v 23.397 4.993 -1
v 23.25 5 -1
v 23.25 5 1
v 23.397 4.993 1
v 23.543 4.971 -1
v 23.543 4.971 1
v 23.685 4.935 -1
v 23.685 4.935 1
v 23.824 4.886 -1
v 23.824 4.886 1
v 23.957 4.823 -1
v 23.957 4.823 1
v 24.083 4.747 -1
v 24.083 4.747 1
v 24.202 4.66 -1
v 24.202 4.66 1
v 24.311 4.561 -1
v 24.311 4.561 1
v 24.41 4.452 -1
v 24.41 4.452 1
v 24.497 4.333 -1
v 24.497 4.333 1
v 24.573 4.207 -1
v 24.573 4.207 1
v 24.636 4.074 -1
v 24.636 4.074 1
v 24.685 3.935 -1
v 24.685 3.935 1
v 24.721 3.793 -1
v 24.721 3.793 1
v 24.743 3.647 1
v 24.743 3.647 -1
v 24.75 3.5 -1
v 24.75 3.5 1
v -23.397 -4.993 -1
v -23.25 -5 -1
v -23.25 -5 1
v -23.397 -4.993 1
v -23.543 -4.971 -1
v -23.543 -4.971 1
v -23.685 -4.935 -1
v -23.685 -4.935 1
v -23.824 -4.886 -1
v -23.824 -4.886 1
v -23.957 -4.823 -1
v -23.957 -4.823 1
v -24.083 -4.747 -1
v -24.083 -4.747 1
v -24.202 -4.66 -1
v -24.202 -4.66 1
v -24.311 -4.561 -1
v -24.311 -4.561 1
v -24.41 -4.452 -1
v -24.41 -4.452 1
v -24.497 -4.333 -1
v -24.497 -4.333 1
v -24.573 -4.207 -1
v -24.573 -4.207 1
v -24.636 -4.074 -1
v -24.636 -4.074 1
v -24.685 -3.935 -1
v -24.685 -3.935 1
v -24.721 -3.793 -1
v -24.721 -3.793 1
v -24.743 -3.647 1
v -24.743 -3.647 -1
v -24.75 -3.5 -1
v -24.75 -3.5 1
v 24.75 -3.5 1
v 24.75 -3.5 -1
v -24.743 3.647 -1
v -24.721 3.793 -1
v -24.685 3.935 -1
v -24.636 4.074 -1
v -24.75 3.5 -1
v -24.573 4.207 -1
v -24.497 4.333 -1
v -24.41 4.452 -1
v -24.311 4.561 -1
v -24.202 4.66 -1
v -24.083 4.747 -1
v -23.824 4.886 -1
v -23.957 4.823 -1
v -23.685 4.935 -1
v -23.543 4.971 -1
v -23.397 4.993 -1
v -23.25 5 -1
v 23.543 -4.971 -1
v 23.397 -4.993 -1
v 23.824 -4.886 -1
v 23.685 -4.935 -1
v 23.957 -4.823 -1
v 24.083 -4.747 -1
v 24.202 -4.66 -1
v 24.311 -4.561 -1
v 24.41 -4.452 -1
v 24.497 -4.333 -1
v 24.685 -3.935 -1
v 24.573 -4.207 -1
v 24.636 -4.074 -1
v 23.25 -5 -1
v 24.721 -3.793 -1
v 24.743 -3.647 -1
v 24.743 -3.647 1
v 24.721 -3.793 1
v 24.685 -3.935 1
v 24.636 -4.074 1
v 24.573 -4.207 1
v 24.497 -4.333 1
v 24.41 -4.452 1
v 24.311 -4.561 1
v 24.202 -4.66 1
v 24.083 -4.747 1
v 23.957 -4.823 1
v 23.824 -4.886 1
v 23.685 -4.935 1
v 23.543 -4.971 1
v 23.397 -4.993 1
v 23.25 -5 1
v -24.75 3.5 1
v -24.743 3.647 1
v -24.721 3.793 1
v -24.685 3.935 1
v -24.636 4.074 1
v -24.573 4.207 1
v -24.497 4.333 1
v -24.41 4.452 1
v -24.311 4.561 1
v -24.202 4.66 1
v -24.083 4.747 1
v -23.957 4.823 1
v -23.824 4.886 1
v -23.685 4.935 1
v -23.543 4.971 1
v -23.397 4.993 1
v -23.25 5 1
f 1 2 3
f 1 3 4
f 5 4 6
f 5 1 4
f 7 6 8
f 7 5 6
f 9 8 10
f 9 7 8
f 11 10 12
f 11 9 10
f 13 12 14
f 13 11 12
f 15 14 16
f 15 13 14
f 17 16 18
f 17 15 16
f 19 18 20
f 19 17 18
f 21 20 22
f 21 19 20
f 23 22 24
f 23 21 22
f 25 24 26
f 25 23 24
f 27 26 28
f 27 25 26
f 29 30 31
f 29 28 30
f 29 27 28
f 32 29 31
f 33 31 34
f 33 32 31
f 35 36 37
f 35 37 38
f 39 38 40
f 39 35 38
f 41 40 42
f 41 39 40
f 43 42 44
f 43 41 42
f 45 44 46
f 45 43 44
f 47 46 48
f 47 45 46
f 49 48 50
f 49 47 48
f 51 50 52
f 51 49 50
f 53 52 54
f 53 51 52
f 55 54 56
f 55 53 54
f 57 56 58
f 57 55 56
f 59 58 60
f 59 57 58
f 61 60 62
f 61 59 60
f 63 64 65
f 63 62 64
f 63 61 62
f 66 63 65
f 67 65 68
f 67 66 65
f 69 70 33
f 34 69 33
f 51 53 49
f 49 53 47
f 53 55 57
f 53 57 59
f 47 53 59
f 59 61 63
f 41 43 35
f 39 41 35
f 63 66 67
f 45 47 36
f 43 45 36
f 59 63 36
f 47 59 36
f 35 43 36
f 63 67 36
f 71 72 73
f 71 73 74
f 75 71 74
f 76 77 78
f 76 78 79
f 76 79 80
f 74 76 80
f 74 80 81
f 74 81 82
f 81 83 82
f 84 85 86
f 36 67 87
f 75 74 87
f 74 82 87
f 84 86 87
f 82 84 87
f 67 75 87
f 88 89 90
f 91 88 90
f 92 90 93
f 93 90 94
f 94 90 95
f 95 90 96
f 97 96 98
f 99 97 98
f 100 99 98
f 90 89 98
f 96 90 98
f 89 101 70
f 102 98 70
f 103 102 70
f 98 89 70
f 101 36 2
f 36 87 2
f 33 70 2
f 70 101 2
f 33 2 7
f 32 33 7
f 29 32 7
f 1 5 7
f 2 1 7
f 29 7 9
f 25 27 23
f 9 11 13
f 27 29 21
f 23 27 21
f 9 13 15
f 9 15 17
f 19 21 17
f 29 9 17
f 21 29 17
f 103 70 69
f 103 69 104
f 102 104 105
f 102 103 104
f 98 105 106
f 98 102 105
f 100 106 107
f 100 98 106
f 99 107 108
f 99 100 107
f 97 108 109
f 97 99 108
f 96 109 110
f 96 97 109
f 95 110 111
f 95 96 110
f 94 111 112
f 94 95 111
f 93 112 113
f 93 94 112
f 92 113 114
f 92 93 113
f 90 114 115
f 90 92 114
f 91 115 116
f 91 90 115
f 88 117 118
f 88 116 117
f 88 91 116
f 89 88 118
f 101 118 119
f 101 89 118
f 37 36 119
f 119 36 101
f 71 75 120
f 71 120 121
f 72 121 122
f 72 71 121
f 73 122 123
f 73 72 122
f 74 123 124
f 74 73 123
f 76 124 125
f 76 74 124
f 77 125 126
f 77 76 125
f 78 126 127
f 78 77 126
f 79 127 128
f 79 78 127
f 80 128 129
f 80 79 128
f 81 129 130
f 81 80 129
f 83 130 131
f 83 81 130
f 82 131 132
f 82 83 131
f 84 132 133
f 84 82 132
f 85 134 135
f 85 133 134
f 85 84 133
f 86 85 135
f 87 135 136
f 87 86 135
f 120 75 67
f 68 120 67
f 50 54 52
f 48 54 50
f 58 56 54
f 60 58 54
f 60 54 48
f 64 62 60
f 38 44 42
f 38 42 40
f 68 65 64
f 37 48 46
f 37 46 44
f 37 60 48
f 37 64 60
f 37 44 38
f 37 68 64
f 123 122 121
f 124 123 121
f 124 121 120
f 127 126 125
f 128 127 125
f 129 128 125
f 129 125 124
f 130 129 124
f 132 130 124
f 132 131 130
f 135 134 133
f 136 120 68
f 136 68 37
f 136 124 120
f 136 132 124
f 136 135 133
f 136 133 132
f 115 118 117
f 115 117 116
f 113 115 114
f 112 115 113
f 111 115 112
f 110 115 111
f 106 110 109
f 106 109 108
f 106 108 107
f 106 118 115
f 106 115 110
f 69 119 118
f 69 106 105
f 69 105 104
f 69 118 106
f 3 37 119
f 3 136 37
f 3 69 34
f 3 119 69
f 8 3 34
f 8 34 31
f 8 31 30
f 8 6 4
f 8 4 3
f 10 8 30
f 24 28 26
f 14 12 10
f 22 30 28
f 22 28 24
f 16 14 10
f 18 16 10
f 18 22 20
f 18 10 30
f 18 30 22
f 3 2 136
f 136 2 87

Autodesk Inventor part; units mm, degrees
ref_plane "YZ Plane" through (0, 0, 0) normal (1, 0, 0) x (0, 1, 0)
ref_plane "XZ Plane" through (0, 0, 0) normal (0, 1, 0) x (-1, 0, 0)
ref_plane "XY Plane" through (0, 0, 0) normal (0, 0, 1) x (1, 0, 0)
sketch "草圖1" plane through (0, 0, 0) normal (0, 0, 1) x (1, 0, 0)
  line L0 (0, 0) -> (-25.6572, 0) construction
  line L1 (0, 0) -> (0, 24.1407) construction
  line L2 (-23.25, -5) -> (23.25, -5)
  line L3 (24.75, -3.5) -> (24.75, 3.5)
  line L4 (23.25, 5) -> (-23.25, 5)
  line L5 (-24.75, 3.5) -> (-24.75, -3.5)
  line L6 (-24.75, -5) -> (24.75, 5) construction
  line L7 (24.75, -5) -> (-24.75, 5) construction
  arc A0 (23.25, -5) -> (24.75, -3.5) centre (23.25, -3.5) ccw
  arc A1 (-24.75, -3.5) -> (-23.25, -5) centre (-23.25, -3.5) ccw
  arc A2 (24.75, 3.5) -> (23.25, 5) centre (23.25, 3.5) ccw
  arc A3 (-23.25, 5) -> (-24.75, 3.5) centre (-23.25, 3.5) ccw
  dimension "d0" = 49.5
  dimension "d1" = 10
  dimension "d4" = 1.5
  dimension "d5" = 1.5
extrude "擠出1" add sketch "草圖1" along normal mid plane 2
equation "\"d4\" = d5"
equation "\"折彎半徑\" = 厚度"
equation "\"折彎離隙寬度\" = 厚度"
equation "\"折彎離隙深度\" = 0.5 * 厚度"
equation "\"最小剩餘\" = 2 * 厚度"
equation "\"轉移半徑\" = 折彎半徑"
equation "\"Jacobi半徑大小\" = 折彎半徑"
equation "\"間隙大小\" = 厚度"
equation "\"厚度\" = 2.5"
properties part number "0 零件" material "不鏽鋼SUS-HL(砂紋)"
